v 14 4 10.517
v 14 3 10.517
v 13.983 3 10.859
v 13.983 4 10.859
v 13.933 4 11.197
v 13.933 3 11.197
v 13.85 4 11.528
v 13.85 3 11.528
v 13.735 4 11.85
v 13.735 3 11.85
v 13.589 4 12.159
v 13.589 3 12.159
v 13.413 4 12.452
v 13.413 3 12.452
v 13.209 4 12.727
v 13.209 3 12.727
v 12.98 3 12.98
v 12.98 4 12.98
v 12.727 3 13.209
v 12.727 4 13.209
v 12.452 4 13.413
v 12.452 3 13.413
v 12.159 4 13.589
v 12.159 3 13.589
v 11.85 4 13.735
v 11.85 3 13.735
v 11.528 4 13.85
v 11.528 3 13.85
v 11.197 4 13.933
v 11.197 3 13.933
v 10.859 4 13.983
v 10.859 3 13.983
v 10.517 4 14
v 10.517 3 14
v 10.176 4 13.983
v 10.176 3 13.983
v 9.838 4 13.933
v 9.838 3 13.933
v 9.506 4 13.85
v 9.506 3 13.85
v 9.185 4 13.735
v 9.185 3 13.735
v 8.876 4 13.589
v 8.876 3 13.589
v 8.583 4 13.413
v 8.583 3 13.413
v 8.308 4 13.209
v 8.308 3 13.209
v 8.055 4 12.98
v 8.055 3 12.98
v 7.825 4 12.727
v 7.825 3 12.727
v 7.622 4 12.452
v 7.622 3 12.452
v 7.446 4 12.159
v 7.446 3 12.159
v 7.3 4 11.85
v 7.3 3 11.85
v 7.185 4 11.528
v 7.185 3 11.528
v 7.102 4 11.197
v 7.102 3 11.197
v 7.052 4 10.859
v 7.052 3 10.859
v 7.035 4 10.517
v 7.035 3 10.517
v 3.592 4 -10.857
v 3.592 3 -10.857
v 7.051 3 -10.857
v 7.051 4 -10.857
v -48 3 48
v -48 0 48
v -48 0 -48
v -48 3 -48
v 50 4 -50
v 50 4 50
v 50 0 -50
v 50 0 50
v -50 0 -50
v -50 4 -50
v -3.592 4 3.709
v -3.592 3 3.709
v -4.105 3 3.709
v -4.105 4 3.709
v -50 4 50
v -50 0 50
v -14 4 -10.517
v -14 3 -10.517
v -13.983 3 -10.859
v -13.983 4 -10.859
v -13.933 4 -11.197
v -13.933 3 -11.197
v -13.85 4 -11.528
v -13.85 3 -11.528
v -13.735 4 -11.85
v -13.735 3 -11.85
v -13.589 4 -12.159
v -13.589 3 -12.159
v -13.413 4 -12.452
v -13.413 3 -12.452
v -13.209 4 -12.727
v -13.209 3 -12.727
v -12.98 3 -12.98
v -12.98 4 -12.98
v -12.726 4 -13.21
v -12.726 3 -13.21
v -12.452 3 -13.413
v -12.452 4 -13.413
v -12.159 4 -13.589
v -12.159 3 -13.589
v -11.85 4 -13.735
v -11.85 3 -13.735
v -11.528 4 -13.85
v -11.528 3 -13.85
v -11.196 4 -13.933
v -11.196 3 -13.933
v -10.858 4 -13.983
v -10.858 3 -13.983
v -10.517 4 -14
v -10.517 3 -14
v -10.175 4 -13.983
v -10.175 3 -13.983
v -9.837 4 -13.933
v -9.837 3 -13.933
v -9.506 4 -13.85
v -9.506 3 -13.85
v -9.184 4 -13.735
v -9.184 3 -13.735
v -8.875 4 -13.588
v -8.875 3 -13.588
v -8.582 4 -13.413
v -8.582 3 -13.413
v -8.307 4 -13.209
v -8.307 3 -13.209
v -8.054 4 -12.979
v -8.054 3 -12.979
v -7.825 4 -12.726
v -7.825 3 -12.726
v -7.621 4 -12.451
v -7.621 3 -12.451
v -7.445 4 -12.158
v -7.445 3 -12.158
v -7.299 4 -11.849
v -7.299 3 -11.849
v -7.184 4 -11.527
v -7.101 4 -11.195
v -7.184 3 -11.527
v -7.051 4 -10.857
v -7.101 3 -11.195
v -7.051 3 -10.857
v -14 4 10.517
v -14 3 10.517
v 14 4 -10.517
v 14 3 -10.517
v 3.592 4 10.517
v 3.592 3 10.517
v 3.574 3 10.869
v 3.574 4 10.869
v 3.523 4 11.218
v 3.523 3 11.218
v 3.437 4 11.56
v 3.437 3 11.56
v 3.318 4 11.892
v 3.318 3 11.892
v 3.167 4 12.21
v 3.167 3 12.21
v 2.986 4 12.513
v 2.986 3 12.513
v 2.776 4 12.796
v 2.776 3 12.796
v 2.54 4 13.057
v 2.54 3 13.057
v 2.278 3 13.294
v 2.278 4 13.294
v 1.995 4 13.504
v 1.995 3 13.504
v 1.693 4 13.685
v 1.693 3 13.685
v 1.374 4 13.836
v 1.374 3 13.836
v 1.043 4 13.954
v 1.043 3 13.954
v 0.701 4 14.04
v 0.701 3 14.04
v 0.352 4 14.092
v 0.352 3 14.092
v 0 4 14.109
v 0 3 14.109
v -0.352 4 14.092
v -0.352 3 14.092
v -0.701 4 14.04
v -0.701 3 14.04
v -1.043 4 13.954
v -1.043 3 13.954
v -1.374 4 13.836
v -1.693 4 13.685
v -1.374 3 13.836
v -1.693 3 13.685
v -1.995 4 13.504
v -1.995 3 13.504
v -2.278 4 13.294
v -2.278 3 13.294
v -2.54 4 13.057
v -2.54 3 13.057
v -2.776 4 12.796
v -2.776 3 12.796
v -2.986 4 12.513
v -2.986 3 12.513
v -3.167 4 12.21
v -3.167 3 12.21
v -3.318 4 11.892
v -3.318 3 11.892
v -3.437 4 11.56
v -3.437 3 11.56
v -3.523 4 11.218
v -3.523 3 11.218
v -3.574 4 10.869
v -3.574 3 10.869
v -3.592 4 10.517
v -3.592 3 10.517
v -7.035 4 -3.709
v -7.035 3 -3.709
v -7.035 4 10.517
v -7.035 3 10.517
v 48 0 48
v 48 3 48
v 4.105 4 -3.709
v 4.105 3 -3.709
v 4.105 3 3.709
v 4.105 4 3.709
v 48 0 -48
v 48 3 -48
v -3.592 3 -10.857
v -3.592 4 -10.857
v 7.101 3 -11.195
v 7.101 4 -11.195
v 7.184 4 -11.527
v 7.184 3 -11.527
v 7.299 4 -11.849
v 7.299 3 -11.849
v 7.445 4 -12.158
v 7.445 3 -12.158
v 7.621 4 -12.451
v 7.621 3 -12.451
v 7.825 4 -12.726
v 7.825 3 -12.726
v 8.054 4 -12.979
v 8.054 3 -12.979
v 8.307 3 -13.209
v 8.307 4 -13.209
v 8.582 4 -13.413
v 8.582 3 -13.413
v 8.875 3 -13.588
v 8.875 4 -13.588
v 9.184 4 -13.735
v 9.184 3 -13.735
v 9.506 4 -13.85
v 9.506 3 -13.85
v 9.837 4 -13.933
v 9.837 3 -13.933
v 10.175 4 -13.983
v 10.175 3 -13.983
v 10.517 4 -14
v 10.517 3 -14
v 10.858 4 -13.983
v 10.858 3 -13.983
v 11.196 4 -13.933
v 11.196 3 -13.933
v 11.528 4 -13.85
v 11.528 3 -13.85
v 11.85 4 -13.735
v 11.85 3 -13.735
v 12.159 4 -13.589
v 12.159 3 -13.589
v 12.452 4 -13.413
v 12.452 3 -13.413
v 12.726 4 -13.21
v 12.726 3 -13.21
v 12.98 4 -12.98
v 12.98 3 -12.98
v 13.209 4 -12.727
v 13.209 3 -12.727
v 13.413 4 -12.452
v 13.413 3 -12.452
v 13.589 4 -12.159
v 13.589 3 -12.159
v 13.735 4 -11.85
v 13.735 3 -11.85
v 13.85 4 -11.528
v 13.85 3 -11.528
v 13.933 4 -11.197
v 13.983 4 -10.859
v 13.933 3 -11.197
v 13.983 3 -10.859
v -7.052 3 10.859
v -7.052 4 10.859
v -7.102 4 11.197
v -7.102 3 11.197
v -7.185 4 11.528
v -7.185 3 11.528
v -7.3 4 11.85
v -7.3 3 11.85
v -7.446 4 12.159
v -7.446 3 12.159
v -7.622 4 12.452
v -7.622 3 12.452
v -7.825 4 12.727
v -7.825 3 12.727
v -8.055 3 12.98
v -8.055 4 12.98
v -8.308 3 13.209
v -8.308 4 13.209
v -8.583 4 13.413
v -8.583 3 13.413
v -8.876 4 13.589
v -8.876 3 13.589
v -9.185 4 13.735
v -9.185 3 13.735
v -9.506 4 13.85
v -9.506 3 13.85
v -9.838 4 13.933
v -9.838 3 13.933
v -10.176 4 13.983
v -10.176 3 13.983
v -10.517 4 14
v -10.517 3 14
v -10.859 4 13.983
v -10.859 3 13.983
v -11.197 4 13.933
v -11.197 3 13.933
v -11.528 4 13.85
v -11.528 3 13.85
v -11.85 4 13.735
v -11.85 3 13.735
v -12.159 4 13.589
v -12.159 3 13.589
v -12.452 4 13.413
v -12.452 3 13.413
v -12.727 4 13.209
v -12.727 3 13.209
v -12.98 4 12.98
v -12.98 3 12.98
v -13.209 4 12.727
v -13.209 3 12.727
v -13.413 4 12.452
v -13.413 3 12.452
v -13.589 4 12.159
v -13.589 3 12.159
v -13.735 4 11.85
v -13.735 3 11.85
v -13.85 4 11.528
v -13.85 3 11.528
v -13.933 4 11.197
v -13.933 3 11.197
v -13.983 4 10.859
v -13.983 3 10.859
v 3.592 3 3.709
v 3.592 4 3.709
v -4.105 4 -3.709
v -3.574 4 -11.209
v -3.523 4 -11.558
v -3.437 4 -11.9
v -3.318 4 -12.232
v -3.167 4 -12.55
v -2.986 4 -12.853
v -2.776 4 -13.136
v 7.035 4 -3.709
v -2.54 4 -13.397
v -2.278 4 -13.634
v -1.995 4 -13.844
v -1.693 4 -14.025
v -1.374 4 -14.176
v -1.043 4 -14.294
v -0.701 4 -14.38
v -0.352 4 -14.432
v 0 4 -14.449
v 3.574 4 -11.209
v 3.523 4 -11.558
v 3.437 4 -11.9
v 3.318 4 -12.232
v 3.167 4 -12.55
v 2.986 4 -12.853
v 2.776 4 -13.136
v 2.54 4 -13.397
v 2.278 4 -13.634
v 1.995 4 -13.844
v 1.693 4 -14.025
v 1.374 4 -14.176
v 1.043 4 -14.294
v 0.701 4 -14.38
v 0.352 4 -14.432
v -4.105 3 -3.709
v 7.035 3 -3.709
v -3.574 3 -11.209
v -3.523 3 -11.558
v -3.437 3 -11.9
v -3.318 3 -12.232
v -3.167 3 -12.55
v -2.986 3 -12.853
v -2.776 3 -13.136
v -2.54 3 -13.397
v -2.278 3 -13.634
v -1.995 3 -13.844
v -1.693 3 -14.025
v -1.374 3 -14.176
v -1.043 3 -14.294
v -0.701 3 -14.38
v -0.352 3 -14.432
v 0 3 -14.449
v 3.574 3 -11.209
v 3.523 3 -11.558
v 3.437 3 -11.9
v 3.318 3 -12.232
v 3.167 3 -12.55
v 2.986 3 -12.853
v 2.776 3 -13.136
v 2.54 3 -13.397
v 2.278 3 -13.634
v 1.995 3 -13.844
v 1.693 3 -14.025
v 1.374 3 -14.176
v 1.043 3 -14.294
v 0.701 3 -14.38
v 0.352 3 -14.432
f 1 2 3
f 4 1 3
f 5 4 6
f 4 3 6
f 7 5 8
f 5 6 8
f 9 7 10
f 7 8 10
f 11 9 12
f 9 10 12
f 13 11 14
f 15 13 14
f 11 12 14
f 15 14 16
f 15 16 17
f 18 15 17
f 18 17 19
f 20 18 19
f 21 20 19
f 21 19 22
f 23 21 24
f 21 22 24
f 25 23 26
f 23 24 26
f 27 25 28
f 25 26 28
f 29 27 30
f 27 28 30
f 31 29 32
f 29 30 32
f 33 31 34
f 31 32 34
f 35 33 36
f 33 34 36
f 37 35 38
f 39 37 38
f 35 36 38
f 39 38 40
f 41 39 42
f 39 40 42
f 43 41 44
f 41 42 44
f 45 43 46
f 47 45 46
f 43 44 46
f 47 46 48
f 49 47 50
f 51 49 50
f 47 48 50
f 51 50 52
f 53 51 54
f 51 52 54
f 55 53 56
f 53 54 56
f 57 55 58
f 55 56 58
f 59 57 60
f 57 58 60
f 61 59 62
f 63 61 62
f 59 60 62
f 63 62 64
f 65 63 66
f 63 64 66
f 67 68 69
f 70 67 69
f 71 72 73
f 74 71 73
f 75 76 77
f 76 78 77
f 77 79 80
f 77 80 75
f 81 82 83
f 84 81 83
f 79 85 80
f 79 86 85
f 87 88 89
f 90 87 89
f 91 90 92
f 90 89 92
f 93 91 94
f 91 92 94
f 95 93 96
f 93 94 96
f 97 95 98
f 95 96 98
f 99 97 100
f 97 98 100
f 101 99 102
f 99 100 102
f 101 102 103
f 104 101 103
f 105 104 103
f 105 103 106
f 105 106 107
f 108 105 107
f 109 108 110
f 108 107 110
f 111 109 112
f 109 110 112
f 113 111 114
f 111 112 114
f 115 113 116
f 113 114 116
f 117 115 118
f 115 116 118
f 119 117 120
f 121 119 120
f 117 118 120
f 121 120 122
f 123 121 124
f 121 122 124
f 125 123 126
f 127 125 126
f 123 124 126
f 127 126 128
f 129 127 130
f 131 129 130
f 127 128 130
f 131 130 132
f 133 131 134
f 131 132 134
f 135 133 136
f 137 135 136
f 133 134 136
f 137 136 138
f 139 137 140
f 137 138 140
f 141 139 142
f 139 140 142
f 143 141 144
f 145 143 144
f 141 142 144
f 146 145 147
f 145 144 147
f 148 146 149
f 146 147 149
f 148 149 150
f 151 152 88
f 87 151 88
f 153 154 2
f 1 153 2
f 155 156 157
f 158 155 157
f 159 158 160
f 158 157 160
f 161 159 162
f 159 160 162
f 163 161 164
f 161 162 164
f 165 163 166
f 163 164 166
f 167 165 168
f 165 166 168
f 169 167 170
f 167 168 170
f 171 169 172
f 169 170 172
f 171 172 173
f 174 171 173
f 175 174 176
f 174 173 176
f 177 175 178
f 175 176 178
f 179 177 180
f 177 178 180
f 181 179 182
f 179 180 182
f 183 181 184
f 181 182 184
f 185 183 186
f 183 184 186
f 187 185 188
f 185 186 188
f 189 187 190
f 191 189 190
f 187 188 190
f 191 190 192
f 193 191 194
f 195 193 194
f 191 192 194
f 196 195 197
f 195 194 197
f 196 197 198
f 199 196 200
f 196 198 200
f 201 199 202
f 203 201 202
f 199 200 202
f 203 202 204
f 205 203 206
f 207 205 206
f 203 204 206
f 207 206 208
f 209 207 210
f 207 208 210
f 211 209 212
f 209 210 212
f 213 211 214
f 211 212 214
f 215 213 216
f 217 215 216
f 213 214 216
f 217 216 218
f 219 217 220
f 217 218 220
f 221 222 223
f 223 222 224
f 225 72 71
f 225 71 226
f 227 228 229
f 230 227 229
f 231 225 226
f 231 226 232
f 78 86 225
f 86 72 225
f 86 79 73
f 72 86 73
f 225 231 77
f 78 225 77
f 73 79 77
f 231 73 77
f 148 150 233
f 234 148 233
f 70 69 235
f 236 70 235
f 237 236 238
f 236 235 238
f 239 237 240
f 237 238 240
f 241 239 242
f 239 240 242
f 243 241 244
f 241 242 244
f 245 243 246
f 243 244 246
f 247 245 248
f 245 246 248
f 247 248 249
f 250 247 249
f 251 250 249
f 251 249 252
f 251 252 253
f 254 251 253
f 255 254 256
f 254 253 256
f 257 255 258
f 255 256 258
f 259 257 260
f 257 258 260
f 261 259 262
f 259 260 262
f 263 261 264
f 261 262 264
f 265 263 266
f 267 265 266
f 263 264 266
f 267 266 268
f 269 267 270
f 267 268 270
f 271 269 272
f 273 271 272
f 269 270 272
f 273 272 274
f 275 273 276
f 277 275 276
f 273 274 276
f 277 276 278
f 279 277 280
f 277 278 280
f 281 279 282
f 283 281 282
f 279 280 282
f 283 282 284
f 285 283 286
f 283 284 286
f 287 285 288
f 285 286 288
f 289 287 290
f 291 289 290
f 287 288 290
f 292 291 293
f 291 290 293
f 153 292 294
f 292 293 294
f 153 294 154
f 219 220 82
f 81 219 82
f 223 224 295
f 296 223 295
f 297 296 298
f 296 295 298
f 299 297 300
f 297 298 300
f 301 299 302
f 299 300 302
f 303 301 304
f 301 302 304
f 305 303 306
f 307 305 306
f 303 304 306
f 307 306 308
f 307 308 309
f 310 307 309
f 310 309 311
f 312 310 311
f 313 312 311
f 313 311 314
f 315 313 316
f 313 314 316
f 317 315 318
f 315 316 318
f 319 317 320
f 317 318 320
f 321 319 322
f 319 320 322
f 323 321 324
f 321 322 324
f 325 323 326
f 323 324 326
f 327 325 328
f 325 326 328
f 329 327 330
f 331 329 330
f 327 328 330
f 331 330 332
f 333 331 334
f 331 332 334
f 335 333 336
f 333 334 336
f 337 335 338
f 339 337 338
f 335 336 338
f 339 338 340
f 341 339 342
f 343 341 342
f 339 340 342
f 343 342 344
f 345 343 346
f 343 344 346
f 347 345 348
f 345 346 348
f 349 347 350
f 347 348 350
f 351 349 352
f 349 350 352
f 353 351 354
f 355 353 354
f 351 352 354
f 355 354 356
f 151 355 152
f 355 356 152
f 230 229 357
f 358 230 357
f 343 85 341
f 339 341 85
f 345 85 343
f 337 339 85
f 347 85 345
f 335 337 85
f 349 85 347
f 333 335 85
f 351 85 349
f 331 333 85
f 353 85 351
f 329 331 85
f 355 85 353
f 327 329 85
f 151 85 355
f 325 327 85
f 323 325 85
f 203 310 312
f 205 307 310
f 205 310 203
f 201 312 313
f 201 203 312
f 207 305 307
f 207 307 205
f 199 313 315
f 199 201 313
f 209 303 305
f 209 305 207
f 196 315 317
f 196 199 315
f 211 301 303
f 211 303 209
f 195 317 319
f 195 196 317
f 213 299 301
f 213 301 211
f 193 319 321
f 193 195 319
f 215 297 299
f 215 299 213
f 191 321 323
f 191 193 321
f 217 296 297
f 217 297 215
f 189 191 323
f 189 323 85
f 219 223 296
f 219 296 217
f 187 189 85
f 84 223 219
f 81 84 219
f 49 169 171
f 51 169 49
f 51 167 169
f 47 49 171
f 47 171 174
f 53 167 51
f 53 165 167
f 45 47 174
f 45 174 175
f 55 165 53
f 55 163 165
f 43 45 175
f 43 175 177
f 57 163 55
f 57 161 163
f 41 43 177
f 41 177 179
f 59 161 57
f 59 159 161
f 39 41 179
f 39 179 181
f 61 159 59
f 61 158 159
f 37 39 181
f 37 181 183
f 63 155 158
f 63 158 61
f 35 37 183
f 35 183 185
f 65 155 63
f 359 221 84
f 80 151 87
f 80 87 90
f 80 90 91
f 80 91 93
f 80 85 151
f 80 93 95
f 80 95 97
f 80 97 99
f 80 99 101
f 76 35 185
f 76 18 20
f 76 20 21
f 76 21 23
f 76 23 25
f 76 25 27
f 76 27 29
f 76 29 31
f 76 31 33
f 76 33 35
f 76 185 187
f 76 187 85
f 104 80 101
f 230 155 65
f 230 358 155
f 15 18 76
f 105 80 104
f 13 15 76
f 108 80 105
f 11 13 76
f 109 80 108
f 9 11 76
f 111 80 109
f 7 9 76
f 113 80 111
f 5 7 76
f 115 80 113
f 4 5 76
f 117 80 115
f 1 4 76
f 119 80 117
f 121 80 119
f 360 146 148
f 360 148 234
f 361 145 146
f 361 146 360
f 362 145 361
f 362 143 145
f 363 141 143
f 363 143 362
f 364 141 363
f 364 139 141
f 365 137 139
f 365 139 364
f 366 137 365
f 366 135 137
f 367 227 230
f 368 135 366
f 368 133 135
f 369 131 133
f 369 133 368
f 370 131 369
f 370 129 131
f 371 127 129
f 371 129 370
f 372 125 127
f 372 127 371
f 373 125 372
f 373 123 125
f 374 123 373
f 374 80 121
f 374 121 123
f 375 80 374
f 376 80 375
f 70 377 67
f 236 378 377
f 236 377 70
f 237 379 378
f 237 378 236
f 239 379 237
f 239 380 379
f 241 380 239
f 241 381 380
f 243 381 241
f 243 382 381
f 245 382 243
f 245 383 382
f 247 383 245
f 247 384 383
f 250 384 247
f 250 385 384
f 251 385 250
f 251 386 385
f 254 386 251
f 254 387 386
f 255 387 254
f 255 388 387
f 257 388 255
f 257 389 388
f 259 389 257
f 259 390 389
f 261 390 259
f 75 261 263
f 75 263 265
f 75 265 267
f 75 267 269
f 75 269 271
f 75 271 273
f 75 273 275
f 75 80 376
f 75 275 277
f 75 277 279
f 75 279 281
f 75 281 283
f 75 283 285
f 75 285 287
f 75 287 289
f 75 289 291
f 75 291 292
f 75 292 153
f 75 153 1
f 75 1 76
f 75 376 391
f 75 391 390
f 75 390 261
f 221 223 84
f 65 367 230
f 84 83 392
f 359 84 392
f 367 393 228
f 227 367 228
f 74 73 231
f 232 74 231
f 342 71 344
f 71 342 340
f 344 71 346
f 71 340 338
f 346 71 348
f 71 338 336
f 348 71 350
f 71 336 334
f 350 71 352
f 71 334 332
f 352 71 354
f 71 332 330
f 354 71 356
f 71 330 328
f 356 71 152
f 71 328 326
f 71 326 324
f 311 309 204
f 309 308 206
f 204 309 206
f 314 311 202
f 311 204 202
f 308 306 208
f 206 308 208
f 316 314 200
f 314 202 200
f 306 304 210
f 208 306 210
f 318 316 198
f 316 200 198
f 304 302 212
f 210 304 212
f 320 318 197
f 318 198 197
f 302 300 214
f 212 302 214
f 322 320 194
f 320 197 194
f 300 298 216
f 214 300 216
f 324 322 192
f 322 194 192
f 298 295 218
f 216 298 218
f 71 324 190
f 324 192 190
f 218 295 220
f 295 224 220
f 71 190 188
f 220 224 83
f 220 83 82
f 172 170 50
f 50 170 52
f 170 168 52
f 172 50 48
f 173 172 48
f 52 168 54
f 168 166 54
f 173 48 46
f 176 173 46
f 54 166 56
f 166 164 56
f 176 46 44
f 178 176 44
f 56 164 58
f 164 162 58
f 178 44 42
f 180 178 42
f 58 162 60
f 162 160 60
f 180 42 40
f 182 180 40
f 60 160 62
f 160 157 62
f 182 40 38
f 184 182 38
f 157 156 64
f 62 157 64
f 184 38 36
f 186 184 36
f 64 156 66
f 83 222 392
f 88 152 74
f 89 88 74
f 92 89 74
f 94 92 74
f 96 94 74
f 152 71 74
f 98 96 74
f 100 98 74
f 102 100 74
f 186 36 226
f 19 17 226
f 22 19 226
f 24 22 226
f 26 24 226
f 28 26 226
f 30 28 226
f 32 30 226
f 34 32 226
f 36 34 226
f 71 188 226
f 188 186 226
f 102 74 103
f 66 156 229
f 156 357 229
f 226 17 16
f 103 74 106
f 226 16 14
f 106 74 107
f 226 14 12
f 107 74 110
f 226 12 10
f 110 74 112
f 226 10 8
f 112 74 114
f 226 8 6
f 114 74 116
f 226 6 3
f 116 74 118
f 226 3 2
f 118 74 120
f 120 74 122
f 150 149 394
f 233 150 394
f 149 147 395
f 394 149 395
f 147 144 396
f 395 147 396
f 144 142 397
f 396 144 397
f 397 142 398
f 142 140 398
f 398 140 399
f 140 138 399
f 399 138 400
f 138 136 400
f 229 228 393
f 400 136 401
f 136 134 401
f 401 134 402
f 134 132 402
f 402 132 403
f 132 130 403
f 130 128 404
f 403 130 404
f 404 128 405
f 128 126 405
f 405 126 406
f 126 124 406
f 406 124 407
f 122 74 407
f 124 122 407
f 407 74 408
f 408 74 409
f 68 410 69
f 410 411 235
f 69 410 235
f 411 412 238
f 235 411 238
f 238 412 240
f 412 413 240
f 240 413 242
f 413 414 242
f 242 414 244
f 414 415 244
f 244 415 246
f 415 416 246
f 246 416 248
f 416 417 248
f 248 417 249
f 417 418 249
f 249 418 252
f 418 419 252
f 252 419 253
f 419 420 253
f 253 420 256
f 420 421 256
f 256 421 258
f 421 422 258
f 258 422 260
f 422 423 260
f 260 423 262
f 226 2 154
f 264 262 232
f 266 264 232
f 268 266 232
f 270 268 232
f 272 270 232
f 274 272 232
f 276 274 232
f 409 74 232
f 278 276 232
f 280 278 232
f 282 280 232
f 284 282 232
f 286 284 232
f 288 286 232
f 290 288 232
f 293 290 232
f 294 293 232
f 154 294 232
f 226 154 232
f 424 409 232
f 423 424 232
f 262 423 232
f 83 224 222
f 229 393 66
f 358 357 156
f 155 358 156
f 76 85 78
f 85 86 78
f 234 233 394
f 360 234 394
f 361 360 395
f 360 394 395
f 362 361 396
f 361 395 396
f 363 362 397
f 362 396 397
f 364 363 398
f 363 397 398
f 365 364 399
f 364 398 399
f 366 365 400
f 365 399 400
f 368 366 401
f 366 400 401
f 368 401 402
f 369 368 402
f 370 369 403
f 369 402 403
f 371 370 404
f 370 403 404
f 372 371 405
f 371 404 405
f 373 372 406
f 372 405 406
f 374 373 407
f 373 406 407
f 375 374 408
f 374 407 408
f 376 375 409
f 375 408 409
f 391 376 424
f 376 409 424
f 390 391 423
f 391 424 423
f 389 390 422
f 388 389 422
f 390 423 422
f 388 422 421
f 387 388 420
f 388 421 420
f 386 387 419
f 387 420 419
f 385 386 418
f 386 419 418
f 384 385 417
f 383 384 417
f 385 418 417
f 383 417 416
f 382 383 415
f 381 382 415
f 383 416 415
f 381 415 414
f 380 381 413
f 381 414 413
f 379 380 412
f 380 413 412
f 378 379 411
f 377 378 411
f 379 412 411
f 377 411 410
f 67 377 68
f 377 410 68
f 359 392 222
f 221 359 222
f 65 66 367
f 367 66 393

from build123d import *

# Parameters (mm, degrees)
SKETCH1_W           = 100
SKETCH1_H           = 100
SKETCH1_W_2         = 96
SKETCH1_H_2         = 96
BOSS_EXTRUDE1_DEPTH = 3
SKETCH2_W           = 100
SKETCH2_H           = 100
BOSS_EXTRUDE2_DEPTH = 1
CUT_EXTRUDE1_DEPTH  = 1


with BuildPart() as part:
    # Sketch1 → Boss-Extrude1 (new body)
    with BuildSketch(Plane(origin=(0, 0, 0), x_dir=(1, 0, 0), z_dir=(0, 1, 0))):
        Rectangle(SKETCH1_W, SKETCH1_H)
        Rectangle(SKETCH1_W_2, SKETCH1_H_2, mode=Mode.SUBTRACT)
    extrude(amount=BOSS_EXTRUDE1_DEPTH)

    # Sketch2 → Boss-Extrude2 (add)
    with BuildSketch(Plane(origin=(0, 3, 0), x_dir=(1, 0, 0), z_dir=(0, 1, 0))):
        Rectangle(SKETCH2_W, SKETCH2_H)
    extrude(amount=BOSS_EXTRUDE2_DEPTH)

    # Sketch3 → Cut-Extrude1 (cut)
    with BuildSketch(Plane.XZ.offset(-3)):
        with BuildLine():
            Line((-7.034769829, -3.709104883), (-7.034769829, 10.517384915))
            ThreePointArc((-7.034769829, 10.517384915), (-10.517384915, 14), (-14, 10.517384915))
            Line((-14, 10.517384915), (-14, -10.517384915))
            ThreePointArc((-14, -10.517384915), (-10.687570013, -13.995839293), (-7.051402714, -10.857348469))
            Line((-7.051402714, -10.857348469), (-3.591574507, -10.857348469))
            ThreePointArc((-3.591574507, -10.857348469), (0, -14.448922976), (3.591574507, -10.857348469))
            Line((3.591574507, -10.857348469), (7.051402714, -10.857348469))
            ThreePointArc((7.051402714, -10.857348469), (10.687570013, -13.995839293), (14, -10.517384915))
            Line((14, -10.517384915), (14, 10.517384915))
            ThreePointArc((14, 10.517384915), (10.517384915, 14), (7.034769829, 10.517384915))
            Line((7.034769829, 10.517384915), (7.034769829, -3.709104883))
            Line((7.034769829, -3.709104883), (4.104776873, -3.709104883))
            Line((4.104776873, -3.709104883), (4.104776873, 3.709104883))
            Line((4.104776873, 3.709104883), (3.591574507, 3.709104883))
            Line((3.591574507, 3.709104883), (3.591574507, 10.517384915))
            ThreePointArc((3.591574507, 10.517384915), (0, 14.108959421), (-3.591574507, 10.517384915))
            Line((-3.591574507, 10.517384915), (-3.591574507, 3.709104883))
            Line((-3.591574507, 3.709104883), (-4.104776873, 3.709104883))
            Line((-4.104776873, 3.709104883), (-4.104776873, -3.709104883))
            Line((-4.104776873, -3.709104883), (-7.034769829, -3.709104883))
        make_face()
    extrude(amount=-CUT_EXTRUDE1_DEPTH, mode=Mode.SUBTRACT)


solid = part.part
